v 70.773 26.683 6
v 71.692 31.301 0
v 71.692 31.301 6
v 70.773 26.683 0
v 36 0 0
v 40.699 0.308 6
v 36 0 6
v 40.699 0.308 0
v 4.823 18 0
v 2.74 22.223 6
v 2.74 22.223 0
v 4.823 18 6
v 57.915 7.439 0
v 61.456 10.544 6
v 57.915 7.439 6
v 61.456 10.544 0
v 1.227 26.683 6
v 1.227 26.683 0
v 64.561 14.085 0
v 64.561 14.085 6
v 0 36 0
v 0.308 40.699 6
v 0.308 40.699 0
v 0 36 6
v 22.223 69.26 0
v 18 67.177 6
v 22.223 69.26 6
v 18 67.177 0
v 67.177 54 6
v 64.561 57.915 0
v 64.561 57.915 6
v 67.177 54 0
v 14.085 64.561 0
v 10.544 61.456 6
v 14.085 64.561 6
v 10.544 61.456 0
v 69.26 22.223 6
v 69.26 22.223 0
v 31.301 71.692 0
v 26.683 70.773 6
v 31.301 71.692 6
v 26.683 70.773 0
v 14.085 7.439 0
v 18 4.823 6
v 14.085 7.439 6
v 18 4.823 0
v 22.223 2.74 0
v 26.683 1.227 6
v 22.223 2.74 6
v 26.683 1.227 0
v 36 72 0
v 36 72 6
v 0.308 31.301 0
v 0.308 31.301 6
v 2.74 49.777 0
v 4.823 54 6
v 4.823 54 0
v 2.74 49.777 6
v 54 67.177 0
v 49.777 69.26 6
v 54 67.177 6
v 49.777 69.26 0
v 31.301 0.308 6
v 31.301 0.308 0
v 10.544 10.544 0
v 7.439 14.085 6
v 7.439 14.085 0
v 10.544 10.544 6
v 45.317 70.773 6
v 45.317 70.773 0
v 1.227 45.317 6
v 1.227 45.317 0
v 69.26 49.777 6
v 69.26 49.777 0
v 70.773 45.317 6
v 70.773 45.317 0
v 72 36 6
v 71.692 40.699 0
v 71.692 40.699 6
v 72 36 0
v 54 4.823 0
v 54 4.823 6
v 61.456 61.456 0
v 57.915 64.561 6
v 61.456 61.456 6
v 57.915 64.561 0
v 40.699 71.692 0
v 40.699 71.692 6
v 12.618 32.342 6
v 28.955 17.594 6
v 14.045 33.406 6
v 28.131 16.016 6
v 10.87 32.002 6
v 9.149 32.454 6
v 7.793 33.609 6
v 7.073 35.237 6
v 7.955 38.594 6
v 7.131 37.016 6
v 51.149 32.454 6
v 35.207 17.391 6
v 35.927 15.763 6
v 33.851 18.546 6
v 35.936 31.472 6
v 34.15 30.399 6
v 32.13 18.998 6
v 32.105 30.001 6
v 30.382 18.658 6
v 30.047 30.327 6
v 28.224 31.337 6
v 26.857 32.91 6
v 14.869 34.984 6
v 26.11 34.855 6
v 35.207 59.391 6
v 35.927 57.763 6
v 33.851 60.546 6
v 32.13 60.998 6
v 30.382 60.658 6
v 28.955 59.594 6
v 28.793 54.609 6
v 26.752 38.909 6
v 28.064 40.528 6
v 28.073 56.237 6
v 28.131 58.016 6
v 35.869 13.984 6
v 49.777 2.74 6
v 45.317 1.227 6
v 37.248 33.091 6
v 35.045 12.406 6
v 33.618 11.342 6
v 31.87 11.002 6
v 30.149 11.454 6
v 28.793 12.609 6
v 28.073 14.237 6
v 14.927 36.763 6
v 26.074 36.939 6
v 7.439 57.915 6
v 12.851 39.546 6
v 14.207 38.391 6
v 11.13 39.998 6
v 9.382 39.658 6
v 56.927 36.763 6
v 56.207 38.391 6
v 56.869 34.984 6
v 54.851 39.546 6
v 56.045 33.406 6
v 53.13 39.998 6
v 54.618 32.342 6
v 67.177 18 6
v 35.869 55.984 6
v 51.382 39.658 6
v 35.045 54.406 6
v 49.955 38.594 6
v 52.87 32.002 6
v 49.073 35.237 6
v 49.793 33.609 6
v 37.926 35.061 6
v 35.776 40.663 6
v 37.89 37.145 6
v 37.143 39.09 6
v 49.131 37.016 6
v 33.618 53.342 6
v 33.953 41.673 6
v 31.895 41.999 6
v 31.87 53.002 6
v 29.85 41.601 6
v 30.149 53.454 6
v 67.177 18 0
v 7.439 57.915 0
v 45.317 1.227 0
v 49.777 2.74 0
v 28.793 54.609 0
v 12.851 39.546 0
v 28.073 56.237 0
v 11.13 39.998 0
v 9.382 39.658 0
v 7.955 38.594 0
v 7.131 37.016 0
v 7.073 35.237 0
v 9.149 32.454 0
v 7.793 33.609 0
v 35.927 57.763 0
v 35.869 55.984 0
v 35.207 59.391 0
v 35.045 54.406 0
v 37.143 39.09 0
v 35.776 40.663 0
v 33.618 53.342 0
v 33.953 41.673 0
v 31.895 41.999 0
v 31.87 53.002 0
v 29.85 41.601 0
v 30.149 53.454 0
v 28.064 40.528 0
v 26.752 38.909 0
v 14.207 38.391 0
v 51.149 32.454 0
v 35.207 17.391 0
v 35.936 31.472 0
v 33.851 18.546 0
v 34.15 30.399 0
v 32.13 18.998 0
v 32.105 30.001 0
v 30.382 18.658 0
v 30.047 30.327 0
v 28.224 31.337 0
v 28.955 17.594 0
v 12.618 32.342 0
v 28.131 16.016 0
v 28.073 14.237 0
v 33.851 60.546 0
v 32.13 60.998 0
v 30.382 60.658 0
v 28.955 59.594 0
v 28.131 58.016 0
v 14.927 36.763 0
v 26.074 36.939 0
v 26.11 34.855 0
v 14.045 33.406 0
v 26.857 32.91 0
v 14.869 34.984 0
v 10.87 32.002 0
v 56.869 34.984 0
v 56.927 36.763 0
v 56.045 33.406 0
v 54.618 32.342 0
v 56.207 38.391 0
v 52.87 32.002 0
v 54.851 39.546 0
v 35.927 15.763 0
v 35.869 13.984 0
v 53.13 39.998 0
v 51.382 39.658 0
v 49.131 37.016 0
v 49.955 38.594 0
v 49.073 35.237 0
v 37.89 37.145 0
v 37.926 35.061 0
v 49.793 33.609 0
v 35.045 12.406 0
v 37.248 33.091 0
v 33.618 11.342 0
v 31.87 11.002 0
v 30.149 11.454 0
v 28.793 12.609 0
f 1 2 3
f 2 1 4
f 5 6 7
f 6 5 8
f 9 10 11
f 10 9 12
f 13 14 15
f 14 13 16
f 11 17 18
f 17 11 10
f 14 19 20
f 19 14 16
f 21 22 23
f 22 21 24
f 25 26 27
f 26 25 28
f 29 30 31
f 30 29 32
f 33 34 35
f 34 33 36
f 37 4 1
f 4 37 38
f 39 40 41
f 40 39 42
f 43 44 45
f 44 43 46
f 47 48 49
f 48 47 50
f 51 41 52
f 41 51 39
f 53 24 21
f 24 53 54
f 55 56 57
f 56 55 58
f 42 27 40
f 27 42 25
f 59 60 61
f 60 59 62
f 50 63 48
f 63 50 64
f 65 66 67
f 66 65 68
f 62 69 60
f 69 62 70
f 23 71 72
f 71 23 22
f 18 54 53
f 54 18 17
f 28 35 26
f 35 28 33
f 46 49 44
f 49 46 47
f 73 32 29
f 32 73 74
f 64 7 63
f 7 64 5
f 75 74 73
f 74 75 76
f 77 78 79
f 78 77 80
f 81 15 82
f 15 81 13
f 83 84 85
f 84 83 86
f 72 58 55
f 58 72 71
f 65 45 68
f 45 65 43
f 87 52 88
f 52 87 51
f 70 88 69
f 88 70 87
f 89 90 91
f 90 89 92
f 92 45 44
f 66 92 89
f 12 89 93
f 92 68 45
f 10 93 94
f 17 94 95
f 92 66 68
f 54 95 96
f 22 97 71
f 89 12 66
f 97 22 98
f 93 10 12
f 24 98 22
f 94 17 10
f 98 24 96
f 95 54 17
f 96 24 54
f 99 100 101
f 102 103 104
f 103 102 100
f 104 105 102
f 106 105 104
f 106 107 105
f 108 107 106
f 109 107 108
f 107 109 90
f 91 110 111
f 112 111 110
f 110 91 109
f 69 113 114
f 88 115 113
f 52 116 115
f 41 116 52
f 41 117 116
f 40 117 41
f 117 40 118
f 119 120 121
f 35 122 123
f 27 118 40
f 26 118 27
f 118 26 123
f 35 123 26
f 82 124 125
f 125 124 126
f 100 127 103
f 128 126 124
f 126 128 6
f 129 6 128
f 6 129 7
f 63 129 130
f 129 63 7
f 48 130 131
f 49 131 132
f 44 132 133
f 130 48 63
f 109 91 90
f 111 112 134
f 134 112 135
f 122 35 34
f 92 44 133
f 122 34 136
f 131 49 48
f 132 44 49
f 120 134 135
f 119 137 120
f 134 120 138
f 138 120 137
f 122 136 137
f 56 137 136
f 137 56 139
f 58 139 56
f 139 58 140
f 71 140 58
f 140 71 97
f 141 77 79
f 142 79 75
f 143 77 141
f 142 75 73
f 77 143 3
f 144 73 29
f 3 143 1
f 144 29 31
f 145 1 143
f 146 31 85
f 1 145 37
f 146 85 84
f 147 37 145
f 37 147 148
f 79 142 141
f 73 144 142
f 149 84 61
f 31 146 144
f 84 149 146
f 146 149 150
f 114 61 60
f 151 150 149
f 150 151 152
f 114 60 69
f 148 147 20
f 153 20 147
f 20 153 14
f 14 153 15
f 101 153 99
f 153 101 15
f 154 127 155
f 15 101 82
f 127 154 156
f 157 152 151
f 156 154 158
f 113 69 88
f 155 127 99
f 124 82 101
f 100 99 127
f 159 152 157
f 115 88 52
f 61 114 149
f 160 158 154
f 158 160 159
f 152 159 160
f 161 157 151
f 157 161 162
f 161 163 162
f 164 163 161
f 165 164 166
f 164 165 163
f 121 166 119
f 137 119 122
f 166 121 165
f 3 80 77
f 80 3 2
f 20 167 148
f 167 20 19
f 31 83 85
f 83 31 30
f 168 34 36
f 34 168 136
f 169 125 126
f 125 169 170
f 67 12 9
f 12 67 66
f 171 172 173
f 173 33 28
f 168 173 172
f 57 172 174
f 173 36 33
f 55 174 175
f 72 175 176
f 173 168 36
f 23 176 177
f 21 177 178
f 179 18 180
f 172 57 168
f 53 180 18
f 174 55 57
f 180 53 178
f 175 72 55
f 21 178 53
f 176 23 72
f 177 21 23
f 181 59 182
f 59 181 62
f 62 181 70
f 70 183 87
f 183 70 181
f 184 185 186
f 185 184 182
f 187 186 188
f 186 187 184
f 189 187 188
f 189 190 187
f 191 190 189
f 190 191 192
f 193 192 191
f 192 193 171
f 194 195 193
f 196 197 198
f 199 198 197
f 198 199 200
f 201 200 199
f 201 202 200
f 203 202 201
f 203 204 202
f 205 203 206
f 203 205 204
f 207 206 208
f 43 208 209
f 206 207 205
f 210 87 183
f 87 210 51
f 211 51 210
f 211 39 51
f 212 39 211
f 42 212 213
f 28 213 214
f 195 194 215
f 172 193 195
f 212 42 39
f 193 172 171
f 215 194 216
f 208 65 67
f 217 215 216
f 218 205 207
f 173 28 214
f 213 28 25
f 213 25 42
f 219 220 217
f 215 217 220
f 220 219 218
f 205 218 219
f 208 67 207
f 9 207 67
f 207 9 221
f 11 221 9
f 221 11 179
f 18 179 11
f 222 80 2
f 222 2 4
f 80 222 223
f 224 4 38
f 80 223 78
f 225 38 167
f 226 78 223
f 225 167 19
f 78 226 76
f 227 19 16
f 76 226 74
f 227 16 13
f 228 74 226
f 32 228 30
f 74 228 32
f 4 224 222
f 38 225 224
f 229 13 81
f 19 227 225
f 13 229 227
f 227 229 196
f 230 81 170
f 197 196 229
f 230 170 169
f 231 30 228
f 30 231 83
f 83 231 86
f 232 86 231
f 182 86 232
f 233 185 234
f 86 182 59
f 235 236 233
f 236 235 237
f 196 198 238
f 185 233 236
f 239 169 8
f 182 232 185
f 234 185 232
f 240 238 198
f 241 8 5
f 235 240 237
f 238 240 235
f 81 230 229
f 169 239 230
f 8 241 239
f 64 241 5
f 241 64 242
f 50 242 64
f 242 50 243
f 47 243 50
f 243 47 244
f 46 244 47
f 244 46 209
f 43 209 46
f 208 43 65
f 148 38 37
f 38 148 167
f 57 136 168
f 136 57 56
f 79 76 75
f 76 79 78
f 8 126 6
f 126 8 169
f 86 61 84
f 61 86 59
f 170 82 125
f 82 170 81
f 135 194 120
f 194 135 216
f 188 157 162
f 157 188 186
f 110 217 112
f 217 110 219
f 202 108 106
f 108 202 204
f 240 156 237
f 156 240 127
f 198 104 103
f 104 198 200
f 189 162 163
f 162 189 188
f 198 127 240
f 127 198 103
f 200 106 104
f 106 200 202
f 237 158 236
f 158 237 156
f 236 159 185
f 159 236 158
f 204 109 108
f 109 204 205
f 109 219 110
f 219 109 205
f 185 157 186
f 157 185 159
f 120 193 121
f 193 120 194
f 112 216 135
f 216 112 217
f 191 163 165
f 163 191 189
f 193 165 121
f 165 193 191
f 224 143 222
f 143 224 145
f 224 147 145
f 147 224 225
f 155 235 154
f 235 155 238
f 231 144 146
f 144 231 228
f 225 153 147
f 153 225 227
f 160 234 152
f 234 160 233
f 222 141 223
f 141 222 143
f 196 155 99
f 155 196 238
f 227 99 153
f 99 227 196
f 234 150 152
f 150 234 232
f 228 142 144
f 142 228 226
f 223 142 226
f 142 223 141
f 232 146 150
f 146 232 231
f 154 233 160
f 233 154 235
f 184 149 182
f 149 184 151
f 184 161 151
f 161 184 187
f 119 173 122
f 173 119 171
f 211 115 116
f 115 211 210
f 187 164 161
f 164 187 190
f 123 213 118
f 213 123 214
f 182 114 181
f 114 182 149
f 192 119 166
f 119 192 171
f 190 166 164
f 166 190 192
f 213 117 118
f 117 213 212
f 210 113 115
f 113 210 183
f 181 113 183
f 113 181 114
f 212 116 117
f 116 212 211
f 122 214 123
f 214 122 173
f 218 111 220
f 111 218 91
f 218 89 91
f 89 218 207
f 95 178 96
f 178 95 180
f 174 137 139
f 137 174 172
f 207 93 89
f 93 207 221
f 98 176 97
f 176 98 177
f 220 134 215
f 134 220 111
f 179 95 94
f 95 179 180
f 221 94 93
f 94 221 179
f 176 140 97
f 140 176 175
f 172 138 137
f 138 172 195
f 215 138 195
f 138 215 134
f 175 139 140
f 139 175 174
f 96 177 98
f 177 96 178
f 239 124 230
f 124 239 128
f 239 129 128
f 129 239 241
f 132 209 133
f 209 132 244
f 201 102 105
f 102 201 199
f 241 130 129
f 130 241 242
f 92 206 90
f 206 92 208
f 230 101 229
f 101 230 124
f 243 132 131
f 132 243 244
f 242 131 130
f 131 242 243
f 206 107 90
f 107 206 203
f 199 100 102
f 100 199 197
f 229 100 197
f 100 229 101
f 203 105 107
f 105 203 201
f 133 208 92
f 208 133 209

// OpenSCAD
$fn = 32;

// ----------------------------------------------------------------------
// Cam plate: eccentric cam, base R36
// ----------------------------------------------------------------------

// --- parameters (mm) ---
base_r = 36;              // base circle radius
lobe_h = 12;              // cam lobe rise
bore_r = 6;               // shaft bore radius
plate_t = 6;              // plate thickness, Z (extrusion height)
ecc = 4;                  // disc eccentricity
ring_r = 21;              // lightening ring radius
bolt_r = 4;               // lightening hole radius
fit_tol = 0.02;           // declared fit tolerance (prompt contract)
free_tol = 0.2;           // declared free tolerance (prompt contract)

profile = [[72, 36], [71.692, 40.699], [70.773, 45.317], [69.26, 49.777], [67.177, 54], [64.561, 57.915], [61.456, 61.456], [57.915, 64.561], [54, 67.177], [49.777, 69.26], [45.317, 70.773], [40.699, 71.692], [36, 72], [31.301, 71.692], [26.683, 70.773], [22.223, 69.26], [18, 67.177], [14.085, 64.561], [10.544, 61.456], [7.439, 57.915], [4.823, 54], [2.74, 49.777], [1.227, 45.317], [0.308, 40.699], [0, 36], [0.308, 31.301], [1.227, 26.683], [2.74, 22.223], [4.823, 18], [7.439, 14.085], [10.544, 10.544], [14.085, 7.439], [18, 4.823], [22.223, 2.74], [26.683, 1.227], [31.301, 0.308], [36, 0], [40.699, 0.308], [45.317, 1.227], [49.777, 2.74], [54, 4.823], [57.915, 7.439], [61.456, 10.544], [64.561, 14.085], [67.177, 18], [69.26, 22.223], [70.773, 26.683], [71.692, 31.301]];  // primary outline, 48 points, counter clockwise
void_1 = [[37.89, 37.145], [37.143, 39.09], [35.776, 40.663], [33.953, 41.673], [31.895, 41.999], [29.85, 41.601], [28.064, 40.528], [26.752, 38.909], [26.074, 36.939], [26.11, 34.855], [26.857, 32.91], [28.224, 31.337], [30.047, 30.327], [32.105, 30.001], [34.15, 30.399], [35.936, 31.472], [37.248, 33.091], [37.926, 35.061]];  // shaft bore, 18 points
void_2 = [[56.927, 36.763], [56.207, 38.391], [54.851, 39.546], [53.13, 39.998], [51.382, 39.658], [49.955, 38.594], [49.131, 37.016], [49.073, 35.237], [49.793, 33.609], [51.149, 32.454], [52.87, 32.002], [54.618, 32.342], [56.045, 33.406], [56.869, 34.984]];  // lightening hole 1, 14 points
void_3 = [[35.927, 57.763], [35.207, 59.391], [33.851, 60.546], [32.13, 60.998], [30.382, 60.658], [28.955, 59.594], [28.131, 58.016], [28.073, 56.237], [28.793, 54.609], [30.149, 53.454], [31.87, 53.002], [33.618, 53.342], [35.045, 54.406], [35.869, 55.984]];  // lightening hole 2, 14 points
void_4 = [[14.927, 36.763], [14.207, 38.391], [12.851, 39.546], [11.13, 39.998], [9.382, 39.658], [7.955, 38.594], [7.131, 37.016], [7.073, 35.237], [7.793, 33.609], [9.149, 32.454], [10.87, 32.002], [12.618, 32.342], [14.045, 33.406], [14.869, 34.984]];  // lightening hole 3, 14 points
void_5 = [[35.927, 15.763], [35.207, 17.391], [33.851, 18.546], [32.13, 18.998], [30.382, 18.658], [28.955, 17.594], [28.131, 16.016], [28.073, 14.237], [28.793, 12.609], [30.149, 11.454], [31.87, 11.002], [33.618, 11.342], [35.045, 12.406], [35.869, 13.984]];  // lightening hole 4, 14 points

// --- the one profile operation ---
difference() {
  linear_extrude(height = plate_t) polygon(points = profile);
  translate([0, 0, -1])
    linear_extrude(height = plate_t + 2) polygon(points = void_1);
  translate([0, 0, -1])
    linear_extrude(height = plate_t + 2) polygon(points = void_2);
  translate([0, 0, -1])
    linear_extrude(height = plate_t + 2) polygon(points = void_3);
  translate([0, 0, -1])
    linear_extrude(height = plate_t + 2) polygon(points = void_4);
  translate([0, 0, -1])
    linear_extrude(height = plate_t + 2) polygon(points = void_5);
}
